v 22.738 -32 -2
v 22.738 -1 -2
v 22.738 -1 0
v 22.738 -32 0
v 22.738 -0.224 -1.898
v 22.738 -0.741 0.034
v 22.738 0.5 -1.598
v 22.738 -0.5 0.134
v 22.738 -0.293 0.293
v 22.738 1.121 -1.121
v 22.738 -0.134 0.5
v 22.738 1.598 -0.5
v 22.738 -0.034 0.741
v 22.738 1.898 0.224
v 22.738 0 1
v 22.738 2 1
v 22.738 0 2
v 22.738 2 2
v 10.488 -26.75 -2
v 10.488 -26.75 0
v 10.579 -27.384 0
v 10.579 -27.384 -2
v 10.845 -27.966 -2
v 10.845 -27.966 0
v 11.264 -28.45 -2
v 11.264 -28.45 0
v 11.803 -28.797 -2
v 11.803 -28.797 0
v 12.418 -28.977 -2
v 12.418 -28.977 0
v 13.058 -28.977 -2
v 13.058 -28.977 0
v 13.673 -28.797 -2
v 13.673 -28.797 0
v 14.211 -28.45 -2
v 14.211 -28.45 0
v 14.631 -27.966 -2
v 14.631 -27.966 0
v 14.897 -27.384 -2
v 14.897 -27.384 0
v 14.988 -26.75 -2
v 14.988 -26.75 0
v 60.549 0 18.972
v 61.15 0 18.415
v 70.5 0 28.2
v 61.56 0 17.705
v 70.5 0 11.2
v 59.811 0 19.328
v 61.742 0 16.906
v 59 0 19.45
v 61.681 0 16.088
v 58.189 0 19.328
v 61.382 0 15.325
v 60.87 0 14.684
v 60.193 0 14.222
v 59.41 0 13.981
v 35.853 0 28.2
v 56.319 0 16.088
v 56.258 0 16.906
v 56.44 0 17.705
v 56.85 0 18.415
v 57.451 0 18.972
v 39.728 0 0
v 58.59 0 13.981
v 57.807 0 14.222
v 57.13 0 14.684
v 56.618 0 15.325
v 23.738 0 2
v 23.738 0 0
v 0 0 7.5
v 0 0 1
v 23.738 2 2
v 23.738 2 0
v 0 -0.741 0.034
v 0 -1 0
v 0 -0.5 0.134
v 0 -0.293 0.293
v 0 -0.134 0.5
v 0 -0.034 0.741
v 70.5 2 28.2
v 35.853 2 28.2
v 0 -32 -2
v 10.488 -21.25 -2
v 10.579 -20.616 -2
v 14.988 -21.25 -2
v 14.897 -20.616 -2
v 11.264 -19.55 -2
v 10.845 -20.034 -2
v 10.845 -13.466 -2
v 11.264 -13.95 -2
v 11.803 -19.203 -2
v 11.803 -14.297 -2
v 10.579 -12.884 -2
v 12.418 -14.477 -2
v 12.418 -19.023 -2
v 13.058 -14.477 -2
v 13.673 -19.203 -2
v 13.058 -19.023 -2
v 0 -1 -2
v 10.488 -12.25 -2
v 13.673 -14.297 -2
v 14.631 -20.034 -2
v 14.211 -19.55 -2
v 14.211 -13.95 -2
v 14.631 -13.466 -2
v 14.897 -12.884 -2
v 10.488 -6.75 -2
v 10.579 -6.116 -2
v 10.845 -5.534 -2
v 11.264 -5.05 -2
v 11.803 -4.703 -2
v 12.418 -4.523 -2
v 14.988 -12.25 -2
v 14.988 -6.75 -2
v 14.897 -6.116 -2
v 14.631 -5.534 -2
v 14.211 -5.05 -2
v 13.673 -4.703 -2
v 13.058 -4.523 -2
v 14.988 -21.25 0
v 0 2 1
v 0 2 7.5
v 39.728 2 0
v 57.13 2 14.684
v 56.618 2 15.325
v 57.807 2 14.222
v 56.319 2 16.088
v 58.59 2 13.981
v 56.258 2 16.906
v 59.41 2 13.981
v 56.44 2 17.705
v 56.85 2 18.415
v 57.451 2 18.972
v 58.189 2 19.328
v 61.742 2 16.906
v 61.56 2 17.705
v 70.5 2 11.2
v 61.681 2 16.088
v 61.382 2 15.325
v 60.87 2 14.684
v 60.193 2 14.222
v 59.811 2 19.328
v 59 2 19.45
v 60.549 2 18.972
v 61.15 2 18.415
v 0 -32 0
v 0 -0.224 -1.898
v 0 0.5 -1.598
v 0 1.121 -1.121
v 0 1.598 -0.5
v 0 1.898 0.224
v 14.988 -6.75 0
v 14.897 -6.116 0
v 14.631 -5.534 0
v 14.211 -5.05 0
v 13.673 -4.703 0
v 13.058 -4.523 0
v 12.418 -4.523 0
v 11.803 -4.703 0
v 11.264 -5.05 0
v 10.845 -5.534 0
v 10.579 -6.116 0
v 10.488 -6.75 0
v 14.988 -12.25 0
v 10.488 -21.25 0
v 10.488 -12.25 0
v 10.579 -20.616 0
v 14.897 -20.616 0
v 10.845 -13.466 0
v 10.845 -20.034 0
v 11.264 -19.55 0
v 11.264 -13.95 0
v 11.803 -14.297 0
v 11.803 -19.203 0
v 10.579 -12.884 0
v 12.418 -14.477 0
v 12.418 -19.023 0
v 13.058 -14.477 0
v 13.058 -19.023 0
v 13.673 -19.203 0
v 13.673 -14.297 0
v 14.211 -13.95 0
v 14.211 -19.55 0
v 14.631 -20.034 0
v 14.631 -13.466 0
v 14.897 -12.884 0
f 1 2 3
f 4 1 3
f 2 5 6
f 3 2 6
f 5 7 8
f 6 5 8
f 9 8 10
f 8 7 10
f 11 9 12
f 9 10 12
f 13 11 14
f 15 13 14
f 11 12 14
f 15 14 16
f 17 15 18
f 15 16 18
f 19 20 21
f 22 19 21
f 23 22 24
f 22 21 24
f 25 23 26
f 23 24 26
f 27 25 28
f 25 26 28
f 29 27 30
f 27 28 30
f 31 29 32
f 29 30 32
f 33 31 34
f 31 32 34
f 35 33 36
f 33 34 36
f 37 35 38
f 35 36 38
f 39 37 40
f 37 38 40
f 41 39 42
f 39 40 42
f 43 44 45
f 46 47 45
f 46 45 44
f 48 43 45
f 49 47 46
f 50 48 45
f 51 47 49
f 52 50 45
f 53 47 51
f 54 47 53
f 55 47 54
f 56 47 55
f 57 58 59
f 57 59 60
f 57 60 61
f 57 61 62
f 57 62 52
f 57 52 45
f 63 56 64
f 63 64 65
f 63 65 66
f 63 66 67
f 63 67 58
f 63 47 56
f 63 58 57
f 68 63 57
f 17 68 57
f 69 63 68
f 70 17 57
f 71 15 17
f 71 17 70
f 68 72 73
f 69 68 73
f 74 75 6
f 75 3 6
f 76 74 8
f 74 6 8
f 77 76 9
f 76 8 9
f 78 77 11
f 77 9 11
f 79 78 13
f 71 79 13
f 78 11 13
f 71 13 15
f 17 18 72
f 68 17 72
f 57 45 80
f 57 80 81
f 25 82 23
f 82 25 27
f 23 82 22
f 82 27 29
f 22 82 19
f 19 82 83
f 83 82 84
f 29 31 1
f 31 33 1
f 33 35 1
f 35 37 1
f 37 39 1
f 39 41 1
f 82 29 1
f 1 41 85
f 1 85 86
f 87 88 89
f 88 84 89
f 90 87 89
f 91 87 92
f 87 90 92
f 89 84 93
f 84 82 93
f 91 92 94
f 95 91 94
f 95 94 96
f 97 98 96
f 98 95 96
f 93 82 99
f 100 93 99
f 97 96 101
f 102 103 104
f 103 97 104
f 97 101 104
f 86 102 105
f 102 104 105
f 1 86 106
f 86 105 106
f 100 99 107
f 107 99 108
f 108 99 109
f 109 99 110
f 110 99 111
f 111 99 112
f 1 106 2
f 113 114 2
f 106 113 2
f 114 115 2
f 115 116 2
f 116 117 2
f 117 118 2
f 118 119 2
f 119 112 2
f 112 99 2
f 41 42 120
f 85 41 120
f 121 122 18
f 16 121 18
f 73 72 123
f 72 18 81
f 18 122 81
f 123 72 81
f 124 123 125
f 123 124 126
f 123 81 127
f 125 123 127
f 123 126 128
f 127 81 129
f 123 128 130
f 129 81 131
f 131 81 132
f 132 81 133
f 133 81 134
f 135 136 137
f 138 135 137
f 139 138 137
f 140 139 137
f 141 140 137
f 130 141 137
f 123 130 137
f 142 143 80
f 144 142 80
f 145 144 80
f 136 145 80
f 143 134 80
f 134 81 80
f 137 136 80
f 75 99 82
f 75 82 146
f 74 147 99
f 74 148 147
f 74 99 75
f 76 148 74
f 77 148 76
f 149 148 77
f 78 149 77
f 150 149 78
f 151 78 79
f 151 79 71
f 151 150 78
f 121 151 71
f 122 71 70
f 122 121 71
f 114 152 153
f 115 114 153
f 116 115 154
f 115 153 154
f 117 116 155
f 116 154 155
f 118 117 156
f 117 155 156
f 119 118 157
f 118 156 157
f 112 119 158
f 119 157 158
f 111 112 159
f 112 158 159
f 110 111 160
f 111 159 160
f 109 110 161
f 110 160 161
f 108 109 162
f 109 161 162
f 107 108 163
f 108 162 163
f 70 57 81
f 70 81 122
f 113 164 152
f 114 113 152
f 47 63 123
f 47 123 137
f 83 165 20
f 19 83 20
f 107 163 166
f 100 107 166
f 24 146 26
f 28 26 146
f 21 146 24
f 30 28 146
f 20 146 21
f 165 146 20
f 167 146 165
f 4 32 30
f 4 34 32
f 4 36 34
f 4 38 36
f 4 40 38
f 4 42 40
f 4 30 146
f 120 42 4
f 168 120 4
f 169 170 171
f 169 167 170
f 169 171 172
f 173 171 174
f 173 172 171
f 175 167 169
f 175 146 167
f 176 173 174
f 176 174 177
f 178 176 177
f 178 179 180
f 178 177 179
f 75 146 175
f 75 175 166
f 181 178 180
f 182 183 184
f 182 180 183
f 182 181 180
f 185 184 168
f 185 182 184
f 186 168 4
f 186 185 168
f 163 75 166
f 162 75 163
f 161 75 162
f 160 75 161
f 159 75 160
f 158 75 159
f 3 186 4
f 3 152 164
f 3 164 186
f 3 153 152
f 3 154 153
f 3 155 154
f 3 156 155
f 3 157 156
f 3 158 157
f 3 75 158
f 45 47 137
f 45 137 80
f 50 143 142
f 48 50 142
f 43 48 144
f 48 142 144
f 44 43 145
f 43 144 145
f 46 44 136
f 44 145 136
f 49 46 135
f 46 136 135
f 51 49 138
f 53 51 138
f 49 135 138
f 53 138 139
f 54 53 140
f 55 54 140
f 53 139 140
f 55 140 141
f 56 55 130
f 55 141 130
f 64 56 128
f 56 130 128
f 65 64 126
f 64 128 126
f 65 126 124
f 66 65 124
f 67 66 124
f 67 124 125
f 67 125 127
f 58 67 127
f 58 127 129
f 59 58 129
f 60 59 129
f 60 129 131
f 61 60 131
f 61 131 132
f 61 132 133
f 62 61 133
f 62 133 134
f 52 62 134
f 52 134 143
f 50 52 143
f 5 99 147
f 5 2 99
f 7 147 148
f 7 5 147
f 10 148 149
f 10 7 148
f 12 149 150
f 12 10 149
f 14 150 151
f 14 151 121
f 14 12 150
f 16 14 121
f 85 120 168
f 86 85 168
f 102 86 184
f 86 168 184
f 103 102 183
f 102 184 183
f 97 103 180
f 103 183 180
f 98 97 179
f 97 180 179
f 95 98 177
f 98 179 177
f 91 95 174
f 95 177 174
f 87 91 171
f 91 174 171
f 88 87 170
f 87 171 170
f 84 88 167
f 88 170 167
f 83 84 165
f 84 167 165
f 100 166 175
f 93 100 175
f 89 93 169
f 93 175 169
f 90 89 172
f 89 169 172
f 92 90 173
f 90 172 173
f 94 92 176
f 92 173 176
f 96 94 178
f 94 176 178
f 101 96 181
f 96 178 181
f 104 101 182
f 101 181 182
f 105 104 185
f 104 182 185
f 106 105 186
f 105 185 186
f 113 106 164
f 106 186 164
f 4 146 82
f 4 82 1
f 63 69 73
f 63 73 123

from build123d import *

# Parameters (mm, degrees)
EXTRUDE_1_DEPTH      = 2
SKETCH_2_R           = 2.75
CUT_EXTRUDE_1_DEPTH  = 76.957158978
EXTRUDE_2_DEPTH      = 32
EXTRUDE_2_DEPTH_BACK = 2
SKETCH_3_W           = 22.737902435
SKETCH_3_H           = 2
CUT_EXTRUDE_2_DEPTH  = 83.398361634
SKETCH_7_W           = 1
SKETCH_7_H           = 2
CUT_EXTRUDE_3_DEPTH  = 2
FILLET_1_R           = 3
FILLET_2_R           = 1


with BuildPart() as part:
    # 草图1 → 凸台-拉伸1 (new body)
    with BuildSketch(Plane(origin=(0, 0, 0), x_dir=(1, 0, 0), z_dir=(0, 1, 0))):
        Polygon((0, 0), (39.728252902, 0), (70.5, -11.2), (70.5, -28.2), (35.853451717, -28.2), (0, -7.5), align=None)
    extrude(amount=EXTRUDE_1_DEPTH)

    # 草图2 → 切除-拉伸1 (cut, through all)
    with BuildSketch(Plane(origin=(0, 2, 0), x_dir=(1, 0, 0), z_dir=(0, 1, 0))):
        with Locations(Location((59, -16.7, 0), (0, 0, 270))):
            Circle(SKETCH_2_R)
    extrude(amount=-CUT_EXTRUDE_1_DEPTH, mode=Mode.SUBTRACT)

    # 草图3 → 凸台-拉伸2 (add, two sides: drawn at the far end of the back side and taken through both)
    with BuildSketch(Plane.XZ.offset(-EXTRUDE_2_DEPTH_BACK)):
        with Locations((11.368951218, -1)):
            Rectangle(SKETCH_3_W, SKETCH_3_H)
    extrude(amount=EXTRUDE_2_DEPTH + EXTRUDE_2_DEPTH_BACK)

    # 草图4 → 切除-拉伸2 (cut, through all)
    with BuildSketch(Plane(origin=(0, 0, 0), x_dir=(-1, 0, 0), z_dir=(0, 0, -1))):
        with BuildLine():
            Line((-14.987902435, -26.75), (-14.987902435, -21.25))
            ThreePointArc((-14.987902435, -21.25), (-12.737902435, -19), (-10.487902435, -21.25))
            Line((-10.487902435, -21.25), (-10.487902435, -26.75))
            ThreePointArc((-10.487902435, -26.75), (-12.737902435, -29), (-14.987902435, -26.75))
        make_face()
        with BuildLine():
            Line((-14.987902435, -12.25), (-14.987902435, -6.75))
            ThreePointArc((-14.987902435, -6.75), (-12.737902435, -4.5), (-10.487902435, -6.75))
            Line((-10.487902435, -6.75), (-10.487902435, -12.25))
            ThreePointArc((-10.487902435, -12.25), (-12.737902435, -14.5), (-14.987902435, -12.25))
        make_face()
    extrude(amount=CUT_EXTRUDE_2_DEPTH, mode=Mode.SUBTRACT)

    # 草图7 → 切除-拉伸3 (cut)
    with BuildSketch(Plane(origin=(0, 2, 0), x_dir=(1, 0, 0), z_dir=(0, 1, 0))):
        with Locations((23.237902435, -1)):
            Rectangle(SKETCH_7_W, SKETCH_7_H)
    extrude(amount=-CUT_EXTRUDE_3_DEPTH, mode=Mode.SUBTRACT)

    # 圆角1
    fillet_1_edges = [part.edges().sort_by_distance(p)[0] for p in [
        (11.368951218, 2, -2),
    ]]
    fillet(fillet_1_edges, radius=FILLET_1_R)

    # 圆角2
    fillet_2_edges = [part.edges().sort_by_distance(p)[0] for p in [
        (11.368951218, 0, 0),
    ]]
    fillet(fillet_2_edges, radius=FILLET_2_R)


solid = part.part
